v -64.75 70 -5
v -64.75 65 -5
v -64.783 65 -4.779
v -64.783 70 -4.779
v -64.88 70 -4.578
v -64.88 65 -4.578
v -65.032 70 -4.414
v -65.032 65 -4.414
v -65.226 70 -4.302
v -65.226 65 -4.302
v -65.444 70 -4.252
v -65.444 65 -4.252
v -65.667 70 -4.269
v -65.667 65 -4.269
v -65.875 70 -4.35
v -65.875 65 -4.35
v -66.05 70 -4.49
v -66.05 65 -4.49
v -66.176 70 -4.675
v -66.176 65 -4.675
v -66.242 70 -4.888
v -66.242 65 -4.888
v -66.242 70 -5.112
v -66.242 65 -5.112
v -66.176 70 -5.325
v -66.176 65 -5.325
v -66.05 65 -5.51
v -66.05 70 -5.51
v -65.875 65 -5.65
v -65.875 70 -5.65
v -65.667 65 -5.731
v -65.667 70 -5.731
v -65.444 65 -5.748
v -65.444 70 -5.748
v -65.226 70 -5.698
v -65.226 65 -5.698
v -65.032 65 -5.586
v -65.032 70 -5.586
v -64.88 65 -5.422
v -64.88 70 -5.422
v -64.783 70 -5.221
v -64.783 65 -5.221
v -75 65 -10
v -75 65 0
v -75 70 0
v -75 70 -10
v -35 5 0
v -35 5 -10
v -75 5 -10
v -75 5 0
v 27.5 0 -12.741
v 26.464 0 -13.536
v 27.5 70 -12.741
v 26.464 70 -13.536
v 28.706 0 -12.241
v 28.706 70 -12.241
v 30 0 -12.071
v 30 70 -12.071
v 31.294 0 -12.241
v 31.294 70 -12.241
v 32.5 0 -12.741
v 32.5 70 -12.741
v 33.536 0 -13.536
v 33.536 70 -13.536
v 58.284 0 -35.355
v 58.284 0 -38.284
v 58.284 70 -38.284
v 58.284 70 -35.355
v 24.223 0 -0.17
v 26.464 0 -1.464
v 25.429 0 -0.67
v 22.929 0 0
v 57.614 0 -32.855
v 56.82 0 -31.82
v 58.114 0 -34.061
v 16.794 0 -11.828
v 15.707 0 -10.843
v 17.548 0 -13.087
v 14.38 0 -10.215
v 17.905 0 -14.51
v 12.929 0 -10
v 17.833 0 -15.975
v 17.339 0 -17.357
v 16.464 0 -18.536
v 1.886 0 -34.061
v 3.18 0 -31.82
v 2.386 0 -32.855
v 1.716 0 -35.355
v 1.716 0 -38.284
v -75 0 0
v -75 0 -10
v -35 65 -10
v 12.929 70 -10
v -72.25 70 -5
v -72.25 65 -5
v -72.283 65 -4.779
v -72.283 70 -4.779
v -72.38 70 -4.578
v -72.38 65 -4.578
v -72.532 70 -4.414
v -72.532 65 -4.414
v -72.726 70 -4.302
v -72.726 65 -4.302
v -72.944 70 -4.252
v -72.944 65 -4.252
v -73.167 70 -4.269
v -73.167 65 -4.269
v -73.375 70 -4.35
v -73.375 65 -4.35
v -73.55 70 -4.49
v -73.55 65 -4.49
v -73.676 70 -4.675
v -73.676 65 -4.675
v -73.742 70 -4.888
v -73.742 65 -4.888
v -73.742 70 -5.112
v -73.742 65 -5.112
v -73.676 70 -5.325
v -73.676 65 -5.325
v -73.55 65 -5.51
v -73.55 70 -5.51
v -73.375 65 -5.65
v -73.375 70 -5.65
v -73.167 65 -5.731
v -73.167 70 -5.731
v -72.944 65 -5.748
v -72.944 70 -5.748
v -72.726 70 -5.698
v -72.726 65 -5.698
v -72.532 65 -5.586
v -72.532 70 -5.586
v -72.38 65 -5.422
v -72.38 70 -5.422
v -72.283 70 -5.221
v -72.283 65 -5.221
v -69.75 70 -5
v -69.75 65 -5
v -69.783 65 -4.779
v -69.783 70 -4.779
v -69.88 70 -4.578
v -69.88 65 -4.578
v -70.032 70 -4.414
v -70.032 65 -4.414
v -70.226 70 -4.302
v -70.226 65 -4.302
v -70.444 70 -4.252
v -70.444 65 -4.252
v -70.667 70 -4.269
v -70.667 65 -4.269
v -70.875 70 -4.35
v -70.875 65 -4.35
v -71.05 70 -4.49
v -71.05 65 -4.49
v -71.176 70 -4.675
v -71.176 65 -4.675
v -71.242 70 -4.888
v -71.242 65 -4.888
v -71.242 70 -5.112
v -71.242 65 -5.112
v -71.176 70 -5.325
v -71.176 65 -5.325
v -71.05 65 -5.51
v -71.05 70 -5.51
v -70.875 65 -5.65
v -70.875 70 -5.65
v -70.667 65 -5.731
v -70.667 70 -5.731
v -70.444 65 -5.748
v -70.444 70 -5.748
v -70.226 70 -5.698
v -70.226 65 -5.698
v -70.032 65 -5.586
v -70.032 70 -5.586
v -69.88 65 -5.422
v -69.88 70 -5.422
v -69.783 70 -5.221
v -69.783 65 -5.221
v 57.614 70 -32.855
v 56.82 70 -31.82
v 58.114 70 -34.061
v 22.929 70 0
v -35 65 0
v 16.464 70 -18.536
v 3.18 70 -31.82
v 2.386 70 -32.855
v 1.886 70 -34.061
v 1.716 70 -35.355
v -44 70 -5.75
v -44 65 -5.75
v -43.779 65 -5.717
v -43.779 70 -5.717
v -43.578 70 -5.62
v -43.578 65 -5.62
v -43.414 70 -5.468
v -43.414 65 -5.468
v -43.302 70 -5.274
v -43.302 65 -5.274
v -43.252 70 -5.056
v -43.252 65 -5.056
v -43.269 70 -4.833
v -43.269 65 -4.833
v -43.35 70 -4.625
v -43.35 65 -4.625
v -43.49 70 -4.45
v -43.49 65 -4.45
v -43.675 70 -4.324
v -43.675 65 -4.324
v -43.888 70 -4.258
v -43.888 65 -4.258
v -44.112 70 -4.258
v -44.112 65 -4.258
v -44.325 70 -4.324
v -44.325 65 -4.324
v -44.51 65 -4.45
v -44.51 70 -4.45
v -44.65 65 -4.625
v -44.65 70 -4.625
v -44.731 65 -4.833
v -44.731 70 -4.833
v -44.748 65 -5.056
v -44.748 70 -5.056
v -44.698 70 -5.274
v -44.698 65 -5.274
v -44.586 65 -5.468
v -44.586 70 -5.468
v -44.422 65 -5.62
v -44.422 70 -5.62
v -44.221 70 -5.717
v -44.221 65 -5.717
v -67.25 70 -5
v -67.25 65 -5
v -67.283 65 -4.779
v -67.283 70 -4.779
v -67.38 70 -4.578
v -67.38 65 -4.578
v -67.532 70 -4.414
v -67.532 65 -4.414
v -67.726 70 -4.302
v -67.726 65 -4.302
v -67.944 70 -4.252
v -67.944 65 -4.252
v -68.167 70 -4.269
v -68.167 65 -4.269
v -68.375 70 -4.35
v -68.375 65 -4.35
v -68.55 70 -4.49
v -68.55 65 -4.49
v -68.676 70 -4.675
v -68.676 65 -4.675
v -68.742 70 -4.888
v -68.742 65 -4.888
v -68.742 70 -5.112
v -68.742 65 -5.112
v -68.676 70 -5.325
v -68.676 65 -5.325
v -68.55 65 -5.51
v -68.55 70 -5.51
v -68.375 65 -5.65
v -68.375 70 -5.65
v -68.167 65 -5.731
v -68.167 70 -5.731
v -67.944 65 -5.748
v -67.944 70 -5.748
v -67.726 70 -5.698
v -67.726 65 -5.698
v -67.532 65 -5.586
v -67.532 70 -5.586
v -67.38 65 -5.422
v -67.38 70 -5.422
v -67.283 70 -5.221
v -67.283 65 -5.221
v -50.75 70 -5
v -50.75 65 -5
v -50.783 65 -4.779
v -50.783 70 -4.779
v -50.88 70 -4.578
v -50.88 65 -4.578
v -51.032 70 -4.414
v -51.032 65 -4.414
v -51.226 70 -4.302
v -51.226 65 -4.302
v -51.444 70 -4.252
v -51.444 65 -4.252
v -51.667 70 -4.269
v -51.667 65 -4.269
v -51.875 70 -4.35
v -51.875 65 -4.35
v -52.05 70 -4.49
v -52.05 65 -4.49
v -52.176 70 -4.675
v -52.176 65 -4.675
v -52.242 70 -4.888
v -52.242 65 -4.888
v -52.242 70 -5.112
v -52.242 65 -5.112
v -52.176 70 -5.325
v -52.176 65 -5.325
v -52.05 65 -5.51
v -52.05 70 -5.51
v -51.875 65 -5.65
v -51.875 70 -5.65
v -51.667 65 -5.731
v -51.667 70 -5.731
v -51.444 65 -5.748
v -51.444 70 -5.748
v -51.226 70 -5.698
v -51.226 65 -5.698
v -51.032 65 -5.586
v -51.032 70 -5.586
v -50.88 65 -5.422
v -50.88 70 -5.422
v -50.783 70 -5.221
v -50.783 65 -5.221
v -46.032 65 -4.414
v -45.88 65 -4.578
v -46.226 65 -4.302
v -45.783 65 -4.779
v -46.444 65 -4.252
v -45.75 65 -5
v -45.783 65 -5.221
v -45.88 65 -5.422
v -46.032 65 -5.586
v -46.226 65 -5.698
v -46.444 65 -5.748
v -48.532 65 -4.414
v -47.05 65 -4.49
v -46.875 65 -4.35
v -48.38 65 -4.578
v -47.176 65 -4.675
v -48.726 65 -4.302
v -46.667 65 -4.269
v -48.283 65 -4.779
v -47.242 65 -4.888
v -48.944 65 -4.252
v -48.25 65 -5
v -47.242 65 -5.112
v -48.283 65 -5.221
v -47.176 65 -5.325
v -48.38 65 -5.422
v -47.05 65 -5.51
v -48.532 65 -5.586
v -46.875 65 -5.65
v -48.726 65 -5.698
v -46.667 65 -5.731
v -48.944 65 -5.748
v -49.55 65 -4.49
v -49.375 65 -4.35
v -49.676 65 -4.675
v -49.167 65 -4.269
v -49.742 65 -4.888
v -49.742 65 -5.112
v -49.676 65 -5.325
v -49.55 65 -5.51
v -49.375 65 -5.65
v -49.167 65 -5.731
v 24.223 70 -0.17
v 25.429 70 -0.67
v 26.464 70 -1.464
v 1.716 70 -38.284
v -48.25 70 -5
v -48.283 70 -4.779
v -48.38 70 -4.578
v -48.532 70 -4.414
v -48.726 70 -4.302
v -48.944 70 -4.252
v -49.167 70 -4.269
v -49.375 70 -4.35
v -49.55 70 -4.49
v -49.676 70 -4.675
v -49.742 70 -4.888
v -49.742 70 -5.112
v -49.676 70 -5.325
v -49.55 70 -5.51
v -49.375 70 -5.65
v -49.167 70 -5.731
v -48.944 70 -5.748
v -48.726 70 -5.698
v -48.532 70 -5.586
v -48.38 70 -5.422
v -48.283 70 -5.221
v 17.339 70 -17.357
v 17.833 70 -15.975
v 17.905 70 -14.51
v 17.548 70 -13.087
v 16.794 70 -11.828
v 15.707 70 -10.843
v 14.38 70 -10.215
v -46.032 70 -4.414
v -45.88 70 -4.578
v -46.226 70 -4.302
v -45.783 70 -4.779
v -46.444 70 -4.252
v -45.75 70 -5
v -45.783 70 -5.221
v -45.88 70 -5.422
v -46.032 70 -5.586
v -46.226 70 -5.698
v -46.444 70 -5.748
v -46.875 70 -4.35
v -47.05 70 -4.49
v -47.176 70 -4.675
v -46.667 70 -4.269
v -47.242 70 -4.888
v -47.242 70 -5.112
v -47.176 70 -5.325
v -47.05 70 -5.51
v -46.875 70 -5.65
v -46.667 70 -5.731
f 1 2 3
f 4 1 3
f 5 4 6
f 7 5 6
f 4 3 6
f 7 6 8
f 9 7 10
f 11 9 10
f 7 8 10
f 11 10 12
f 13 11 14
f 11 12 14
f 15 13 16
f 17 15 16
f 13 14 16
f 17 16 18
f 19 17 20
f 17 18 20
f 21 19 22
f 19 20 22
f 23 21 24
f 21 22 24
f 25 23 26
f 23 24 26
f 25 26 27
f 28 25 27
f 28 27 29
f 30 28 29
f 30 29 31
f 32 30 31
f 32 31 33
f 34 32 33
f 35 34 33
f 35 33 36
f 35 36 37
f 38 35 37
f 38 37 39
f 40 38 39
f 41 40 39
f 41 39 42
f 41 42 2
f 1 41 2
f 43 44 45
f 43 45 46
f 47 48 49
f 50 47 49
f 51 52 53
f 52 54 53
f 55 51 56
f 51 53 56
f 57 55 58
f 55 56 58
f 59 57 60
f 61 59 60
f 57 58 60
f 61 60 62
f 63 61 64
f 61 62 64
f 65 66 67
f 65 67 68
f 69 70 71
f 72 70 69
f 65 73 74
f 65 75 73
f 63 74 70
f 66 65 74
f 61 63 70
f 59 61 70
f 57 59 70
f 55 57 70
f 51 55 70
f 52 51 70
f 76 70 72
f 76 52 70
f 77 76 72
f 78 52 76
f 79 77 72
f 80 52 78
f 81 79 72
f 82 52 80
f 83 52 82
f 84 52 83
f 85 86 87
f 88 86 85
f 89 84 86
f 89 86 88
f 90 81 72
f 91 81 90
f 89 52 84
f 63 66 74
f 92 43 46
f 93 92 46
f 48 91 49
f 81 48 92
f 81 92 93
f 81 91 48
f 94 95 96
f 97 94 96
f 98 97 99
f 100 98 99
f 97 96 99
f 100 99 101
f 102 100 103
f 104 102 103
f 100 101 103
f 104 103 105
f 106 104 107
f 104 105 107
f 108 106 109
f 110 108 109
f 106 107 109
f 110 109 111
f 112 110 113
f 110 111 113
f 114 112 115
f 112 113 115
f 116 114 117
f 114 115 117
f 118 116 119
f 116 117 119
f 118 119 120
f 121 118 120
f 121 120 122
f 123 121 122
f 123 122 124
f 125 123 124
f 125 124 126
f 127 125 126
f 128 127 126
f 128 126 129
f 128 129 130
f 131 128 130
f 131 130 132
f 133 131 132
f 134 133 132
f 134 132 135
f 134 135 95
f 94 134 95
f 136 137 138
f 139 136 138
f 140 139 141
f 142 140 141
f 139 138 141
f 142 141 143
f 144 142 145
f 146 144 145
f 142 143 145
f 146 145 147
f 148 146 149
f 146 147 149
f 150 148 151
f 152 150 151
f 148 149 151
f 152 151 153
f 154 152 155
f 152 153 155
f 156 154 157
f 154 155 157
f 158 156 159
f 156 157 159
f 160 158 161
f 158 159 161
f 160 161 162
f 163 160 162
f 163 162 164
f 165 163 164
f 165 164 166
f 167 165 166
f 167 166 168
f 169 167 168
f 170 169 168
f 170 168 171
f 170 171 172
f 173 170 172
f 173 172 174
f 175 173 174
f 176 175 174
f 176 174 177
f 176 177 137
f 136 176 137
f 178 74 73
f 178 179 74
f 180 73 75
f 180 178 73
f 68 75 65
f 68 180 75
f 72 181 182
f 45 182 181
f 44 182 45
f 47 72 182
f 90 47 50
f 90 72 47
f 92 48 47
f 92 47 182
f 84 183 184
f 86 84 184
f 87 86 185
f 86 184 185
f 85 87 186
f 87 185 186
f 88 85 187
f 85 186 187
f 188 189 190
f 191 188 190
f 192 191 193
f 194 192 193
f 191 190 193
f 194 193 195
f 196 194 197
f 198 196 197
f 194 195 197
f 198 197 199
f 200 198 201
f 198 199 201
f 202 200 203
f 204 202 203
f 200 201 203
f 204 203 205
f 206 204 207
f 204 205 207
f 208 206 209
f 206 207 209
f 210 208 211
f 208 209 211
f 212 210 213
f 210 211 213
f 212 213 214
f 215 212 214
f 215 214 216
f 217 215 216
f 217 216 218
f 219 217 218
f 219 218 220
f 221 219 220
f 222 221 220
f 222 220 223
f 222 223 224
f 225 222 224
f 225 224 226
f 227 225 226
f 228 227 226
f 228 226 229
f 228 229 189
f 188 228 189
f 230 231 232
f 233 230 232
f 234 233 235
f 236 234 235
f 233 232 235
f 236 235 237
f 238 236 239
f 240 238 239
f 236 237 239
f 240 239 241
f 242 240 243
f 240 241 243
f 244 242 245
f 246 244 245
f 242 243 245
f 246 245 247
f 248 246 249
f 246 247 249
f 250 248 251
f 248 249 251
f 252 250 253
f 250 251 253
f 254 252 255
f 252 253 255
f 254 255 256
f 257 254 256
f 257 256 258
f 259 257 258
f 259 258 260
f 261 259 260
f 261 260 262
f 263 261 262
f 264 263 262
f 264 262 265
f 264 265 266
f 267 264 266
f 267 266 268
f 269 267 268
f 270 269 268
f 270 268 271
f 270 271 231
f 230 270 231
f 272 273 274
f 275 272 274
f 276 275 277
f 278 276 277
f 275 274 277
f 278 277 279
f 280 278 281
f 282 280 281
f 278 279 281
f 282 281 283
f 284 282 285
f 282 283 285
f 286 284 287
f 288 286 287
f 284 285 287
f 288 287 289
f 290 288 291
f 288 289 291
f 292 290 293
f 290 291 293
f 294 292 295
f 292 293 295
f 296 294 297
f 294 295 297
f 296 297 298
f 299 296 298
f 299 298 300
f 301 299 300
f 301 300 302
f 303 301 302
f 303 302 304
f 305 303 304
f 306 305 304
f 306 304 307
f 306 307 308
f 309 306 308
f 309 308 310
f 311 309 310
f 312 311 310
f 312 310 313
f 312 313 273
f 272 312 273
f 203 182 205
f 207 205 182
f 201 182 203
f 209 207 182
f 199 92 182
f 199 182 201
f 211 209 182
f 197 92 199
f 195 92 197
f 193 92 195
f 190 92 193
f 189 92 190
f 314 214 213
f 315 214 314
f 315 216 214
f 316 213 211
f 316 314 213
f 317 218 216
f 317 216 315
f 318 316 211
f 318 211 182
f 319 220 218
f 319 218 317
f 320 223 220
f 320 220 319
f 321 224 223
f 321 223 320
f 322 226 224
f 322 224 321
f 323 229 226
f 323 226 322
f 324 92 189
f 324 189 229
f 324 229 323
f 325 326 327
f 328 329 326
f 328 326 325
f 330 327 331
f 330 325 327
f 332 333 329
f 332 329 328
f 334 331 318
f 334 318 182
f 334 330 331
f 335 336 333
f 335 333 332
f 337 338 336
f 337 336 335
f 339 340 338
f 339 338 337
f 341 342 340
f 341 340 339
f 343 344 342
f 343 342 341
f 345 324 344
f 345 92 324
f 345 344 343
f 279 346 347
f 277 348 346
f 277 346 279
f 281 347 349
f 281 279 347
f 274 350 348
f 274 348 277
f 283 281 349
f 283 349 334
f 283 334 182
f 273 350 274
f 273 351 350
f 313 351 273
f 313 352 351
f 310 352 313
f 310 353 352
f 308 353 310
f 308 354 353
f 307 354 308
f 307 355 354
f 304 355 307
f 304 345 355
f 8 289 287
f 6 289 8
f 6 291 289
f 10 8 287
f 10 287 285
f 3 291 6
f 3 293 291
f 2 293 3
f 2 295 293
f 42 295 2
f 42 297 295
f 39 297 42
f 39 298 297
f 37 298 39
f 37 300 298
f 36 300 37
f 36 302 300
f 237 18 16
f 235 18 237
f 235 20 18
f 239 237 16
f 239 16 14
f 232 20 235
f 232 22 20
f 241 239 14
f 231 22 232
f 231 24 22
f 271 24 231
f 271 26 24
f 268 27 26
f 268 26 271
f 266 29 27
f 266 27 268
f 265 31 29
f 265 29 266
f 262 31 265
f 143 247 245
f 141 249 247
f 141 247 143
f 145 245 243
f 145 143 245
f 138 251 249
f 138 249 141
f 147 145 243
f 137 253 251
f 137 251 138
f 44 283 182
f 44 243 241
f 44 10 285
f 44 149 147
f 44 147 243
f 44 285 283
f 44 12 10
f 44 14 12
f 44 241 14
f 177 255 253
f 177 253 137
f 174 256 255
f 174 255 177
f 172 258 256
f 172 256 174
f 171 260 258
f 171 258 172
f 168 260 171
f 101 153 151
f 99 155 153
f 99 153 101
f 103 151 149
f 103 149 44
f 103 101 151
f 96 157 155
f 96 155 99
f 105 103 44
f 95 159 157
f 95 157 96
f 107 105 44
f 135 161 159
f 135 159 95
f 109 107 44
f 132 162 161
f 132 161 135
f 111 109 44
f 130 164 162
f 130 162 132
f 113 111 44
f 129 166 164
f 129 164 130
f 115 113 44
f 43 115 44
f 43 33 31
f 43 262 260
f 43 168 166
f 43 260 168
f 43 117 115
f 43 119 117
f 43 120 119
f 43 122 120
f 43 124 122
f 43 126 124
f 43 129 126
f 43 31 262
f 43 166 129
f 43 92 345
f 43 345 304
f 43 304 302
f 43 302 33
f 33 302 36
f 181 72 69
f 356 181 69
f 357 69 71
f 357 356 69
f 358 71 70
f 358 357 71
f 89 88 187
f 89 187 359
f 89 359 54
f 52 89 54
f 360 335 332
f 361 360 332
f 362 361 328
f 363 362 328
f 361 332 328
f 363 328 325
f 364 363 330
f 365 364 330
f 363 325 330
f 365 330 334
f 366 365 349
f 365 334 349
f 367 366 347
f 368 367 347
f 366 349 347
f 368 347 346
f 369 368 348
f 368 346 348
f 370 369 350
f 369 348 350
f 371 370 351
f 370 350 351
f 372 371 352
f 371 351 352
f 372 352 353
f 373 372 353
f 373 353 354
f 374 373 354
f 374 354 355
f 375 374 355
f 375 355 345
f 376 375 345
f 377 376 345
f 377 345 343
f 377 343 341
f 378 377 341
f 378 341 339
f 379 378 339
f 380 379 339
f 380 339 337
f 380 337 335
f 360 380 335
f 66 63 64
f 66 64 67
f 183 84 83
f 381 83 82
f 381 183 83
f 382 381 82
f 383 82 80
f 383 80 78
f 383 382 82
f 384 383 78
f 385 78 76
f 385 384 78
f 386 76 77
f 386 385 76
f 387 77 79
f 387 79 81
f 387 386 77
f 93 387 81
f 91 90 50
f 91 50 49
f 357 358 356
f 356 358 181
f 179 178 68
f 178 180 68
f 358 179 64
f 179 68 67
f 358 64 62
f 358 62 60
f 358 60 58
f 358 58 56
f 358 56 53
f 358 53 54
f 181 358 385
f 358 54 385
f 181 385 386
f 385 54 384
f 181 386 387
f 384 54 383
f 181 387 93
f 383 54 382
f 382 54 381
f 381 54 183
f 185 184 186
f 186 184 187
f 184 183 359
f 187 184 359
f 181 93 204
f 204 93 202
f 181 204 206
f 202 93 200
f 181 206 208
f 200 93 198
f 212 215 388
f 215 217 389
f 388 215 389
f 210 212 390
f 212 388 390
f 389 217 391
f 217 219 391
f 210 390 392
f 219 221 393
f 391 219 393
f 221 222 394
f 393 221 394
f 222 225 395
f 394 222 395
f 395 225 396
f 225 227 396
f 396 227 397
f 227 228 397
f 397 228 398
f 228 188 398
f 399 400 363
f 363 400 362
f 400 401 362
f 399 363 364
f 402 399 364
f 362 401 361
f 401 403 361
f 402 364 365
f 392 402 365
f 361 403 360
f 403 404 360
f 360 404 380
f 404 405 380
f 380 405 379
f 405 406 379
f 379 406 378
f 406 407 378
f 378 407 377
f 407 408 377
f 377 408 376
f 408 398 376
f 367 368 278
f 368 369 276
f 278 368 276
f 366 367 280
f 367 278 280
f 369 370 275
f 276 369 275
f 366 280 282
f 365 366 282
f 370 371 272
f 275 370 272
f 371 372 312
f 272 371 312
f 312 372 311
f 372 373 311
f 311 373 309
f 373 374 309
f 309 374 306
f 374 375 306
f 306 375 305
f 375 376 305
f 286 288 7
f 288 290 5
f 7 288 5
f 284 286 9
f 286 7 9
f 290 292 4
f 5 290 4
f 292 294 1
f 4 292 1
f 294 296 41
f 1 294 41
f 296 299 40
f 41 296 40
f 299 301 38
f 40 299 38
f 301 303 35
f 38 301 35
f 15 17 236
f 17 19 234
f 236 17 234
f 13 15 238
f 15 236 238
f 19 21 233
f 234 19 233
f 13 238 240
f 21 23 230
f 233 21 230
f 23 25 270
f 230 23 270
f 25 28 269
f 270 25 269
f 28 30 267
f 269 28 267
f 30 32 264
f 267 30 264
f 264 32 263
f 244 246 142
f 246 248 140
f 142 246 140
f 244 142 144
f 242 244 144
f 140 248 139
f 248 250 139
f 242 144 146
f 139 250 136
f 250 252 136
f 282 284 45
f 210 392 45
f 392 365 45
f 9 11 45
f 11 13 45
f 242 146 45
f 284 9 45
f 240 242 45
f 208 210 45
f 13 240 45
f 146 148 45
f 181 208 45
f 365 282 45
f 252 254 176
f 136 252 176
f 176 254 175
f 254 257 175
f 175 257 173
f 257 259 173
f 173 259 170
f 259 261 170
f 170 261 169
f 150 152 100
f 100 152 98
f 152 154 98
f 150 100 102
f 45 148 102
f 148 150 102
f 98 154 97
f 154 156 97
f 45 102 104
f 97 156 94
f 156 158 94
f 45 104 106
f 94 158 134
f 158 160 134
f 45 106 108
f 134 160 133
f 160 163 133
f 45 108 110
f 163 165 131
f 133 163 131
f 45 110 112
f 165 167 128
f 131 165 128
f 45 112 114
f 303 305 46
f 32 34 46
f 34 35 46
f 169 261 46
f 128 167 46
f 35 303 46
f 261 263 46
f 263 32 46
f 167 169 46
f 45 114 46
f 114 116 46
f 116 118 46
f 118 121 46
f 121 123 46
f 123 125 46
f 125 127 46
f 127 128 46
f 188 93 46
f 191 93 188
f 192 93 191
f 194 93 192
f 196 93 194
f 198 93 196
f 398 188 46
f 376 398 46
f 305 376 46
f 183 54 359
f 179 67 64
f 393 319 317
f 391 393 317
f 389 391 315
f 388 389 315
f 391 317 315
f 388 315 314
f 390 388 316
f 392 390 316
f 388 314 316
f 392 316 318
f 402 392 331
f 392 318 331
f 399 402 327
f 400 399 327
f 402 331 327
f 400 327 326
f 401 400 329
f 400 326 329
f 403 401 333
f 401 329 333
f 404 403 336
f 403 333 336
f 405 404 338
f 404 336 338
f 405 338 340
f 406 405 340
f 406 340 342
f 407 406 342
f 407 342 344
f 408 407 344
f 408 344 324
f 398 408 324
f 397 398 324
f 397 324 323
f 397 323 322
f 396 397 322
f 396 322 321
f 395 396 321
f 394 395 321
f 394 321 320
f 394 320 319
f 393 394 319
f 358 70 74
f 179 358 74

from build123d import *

# Parameters (mm, degrees)
BOSS_EXTRUDE3_DEPTH     = 70
FILLET7_R               = 5
FILLET8_R               = 5
FILLET9_R               = 5
FILLET10_R              = 5
ESQUISSE3_W             = 30
ESQUISSE3_H             = 60
ENL_V_MAT_EXTRU_1_DEPTH = 107.418983269
ESQUISSE5_W             = 10
ESQUISSE5_H             = 60
ENL_V_MAT_EXTRU_2_DEPTH = 107.418983269
ESQUISSE13_R            = 0.75
ENL_V_MAT_EXTRU_3_DEPTH = 10
ESQUISSE4_R             = 0.75
ENL_V_MAT_EXTRU_6_DEPTH = 10


with BuildPart() as part:
    # Sketch1 → Boss-Extrude3 (new body)
    with BuildSketch(Plane(origin=(0, 0, 0), x_dir=(1, 0, 0), z_dir=(0, 1, 0))):
        Polygon((-75, 0), (-75, 10), (25, 10), (1.715728753, 33.284271247), (1.715728753, 38.284271247), (30, 10), (58.284271247, 38.284271247), (58.284271247, 33.284271247), (35, 10), (25, 0), align=None)
    extrude(amount=BOSS_EXTRUDE3_DEPTH)

    # Fillet7
    fillet7_edges = [part.edges().sort_by_distance(p)[0] for p in [
        (30, 35, -10),
    ]]
    fillet(fillet7_edges, radius=FILLET7_R)

    # Fillet8
    fillet8_edges = [part.edges().sort_by_distance(p)[0] for p in [
        (25, 35, -10),
    ]]
    fillet(fillet8_edges, radius=FILLET8_R)

    # Fillet9
    fillet9_edges = [part.edges().sort_by_distance(p)[0] for p in [
        (58.284271247, 35, -33.284271247),
        (1.715728753, 35, -33.284271247),
    ]]
    fillet(fillet9_edges, radius=FILLET9_R)

    # Fillet10
    fillet10_edges = [part.edges().sort_by_distance(p)[0] for p in [
        (25, 35, 0),
    ]]
    fillet(fillet10_edges, radius=FILLET10_R)

    # Esquisse3 → Enlèv. mat.-Extru.1 (cut, through all)
    with BuildSketch(Plane(origin=(0, 0, -10), x_dir=(-1, 0, 0), z_dir=(0, 0, -1))):
        with Locations((60, 35)):
            Rectangle(ESQUISSE3_W, ESQUISSE3_H)
    extrude(amount=-ENL_V_MAT_EXTRU_1_DEPTH, mode=Mode.SUBTRACT)

    # Esquisse5 → Enlèv. mat.-Extru.2 (cut, through all)
    with BuildSketch(Plane(origin=(0, 0, -10), x_dir=(-1, 0, 0), z_dir=(0, 0, -1))):
        with Locations((40, 35)):
            Rectangle(ESQUISSE5_W, ESQUISSE5_H)
    extrude(amount=-ENL_V_MAT_EXTRU_2_DEPTH, mode=Mode.SUBTRACT)

    # Esquisse13 → Enlèv. mat.-Extru.3 (cut)
    with BuildSketch(Plane(origin=(0, 65, 0), x_dir=(-1, 0, 0), z_dir=(0, -1, 0))):
        with Locations(Location((44, 5, 0), (0, 0, 90))):
            Circle(ESQUISSE13_R)
    extrude(amount=-ENL_V_MAT_EXTRU_3_DEPTH, mode=Mode.SUBTRACT)

    # Esquisse4 → Enlèv. mat.-Extru.6 (cut)
    with BuildSketch(Plane.XZ.offset(-65)):
        with Locations((-73, -5)):
            Circle(ESQUISSE4_R)
        with Locations((-68, -5)):
            Circle(ESQUISSE4_R)
        with Locations((-70.5, -5)):
            Circle(ESQUISSE4_R)
        with Locations((-65.5, -5)):
            Circle(ESQUISSE4_R)
        with Locations((-46.5, -5)):
            Circle(ESQUISSE4_R)
        with Locations((-49, -5)):
            Circle(ESQUISSE4_R)
        with Locations((-51.5, -5)):
            Circle(ESQUISSE4_R)
    extrude(amount=-ENL_V_MAT_EXTRU_6_DEPTH, mode=Mode.SUBTRACT)


solid = part.part
